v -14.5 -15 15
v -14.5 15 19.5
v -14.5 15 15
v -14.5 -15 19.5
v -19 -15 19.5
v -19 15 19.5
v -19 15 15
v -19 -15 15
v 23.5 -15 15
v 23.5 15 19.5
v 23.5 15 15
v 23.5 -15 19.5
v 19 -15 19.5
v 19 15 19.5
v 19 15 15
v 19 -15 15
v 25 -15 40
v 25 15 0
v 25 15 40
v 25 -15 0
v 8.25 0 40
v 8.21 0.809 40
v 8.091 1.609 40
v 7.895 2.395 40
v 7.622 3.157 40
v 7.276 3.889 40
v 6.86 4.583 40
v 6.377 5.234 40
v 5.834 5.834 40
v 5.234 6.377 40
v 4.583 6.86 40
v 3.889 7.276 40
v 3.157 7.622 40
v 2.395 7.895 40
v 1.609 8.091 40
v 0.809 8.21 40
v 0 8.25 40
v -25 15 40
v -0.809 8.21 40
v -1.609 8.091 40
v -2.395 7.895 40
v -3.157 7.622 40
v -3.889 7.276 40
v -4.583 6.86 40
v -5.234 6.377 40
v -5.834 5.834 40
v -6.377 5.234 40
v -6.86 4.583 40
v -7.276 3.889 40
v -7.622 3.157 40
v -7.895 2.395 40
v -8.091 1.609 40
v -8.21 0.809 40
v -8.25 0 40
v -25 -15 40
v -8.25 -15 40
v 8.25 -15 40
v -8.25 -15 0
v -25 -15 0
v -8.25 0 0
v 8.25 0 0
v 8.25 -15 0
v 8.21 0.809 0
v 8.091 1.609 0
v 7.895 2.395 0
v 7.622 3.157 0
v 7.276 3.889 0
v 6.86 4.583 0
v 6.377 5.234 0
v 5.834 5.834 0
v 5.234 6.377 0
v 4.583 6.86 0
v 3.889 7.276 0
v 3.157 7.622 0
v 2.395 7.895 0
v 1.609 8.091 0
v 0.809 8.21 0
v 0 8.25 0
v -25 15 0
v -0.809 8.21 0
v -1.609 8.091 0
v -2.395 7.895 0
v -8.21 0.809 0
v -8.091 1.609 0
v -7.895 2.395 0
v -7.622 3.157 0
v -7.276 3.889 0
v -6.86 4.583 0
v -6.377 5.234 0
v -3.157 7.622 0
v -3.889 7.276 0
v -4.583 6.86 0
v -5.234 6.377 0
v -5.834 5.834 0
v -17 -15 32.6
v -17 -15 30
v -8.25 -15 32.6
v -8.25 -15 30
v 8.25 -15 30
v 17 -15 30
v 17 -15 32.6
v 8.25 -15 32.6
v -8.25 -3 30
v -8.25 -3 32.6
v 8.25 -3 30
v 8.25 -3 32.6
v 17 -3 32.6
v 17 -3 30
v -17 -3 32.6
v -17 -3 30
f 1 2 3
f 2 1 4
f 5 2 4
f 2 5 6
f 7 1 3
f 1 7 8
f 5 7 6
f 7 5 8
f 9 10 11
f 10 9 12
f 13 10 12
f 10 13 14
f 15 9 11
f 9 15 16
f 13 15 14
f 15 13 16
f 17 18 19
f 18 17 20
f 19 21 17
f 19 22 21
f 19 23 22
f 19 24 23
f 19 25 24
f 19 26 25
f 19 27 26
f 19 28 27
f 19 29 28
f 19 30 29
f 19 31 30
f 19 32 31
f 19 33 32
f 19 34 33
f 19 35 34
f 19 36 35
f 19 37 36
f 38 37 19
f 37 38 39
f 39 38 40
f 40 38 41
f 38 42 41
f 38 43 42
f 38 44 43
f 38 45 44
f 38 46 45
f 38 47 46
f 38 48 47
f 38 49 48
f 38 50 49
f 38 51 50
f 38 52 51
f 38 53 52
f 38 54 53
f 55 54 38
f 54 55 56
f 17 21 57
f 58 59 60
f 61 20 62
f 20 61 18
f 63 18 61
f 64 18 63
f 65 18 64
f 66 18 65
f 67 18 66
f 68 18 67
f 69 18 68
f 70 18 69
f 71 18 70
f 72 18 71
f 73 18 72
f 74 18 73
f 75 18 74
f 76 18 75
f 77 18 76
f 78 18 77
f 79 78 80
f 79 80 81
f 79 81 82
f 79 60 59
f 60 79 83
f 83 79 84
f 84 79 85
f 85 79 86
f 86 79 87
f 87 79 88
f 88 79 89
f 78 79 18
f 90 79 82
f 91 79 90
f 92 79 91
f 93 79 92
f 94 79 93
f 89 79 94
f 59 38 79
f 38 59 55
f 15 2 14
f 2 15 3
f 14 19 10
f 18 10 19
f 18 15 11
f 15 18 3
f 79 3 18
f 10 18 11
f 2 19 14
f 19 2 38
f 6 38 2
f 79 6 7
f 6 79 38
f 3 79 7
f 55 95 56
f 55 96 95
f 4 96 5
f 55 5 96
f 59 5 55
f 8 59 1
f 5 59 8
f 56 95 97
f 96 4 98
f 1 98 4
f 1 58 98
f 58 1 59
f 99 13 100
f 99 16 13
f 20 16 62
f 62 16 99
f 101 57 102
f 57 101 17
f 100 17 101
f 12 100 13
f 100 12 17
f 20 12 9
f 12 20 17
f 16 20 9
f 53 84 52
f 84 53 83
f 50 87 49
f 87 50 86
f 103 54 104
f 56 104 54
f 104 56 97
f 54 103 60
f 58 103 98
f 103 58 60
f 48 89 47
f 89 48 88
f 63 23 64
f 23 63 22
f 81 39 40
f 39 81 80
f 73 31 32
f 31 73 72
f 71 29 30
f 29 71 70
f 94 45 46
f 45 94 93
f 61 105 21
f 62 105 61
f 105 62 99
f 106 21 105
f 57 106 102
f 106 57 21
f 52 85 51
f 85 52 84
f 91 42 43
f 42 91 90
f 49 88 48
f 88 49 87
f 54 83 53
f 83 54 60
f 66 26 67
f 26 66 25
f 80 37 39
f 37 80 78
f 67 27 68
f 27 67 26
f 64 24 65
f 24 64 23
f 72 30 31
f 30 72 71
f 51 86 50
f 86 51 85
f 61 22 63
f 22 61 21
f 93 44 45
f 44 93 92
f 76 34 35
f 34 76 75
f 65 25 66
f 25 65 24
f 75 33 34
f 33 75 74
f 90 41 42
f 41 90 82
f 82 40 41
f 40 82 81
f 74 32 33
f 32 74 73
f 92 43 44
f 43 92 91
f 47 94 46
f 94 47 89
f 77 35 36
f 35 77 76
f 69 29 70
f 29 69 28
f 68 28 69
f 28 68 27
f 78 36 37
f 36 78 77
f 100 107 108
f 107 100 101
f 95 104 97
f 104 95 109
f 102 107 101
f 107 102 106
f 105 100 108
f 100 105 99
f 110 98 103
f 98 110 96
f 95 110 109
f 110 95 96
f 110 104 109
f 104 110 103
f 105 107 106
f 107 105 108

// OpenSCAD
// Wall-mounted syringe holder for 10mL syringe
// Designed for FDM printing, standing on the XY plane.

// --- Dimensions ---
block_w = 50.0;      // Block width (X)
block_d = 30.0;      // Block depth (Y)
block_h = 40.0;      // Block height (Z)

barrel_dia = 16.5;   // Width of the vertical barrel channel
barrel_rad = barrel_dia / 2;

flange_w = 34.0;     // Width of the flange slot (X)
flange_h = 2.6;      // Height of the flange slot (Z)
flange_z_start = 30.0; // Bottom of the flange slot
flange_y_depth = 11.0; // How far back the slot goes from the front face

screw_hole_d = 4.5;  // Diameter for M4 screws
screw_hole_x = 19.0; // Offset of screw holes from center (X)
screw_hole_z = 15.0; // Height of screw holes (Z)

$fn = 64;

// --- Modeling ---

// The block is centered on X and Y.
// X: -25 to 25
// Y: -15 to 15 (Back face at y=15, Front face at y=-15)
// Z: 0 to 40

difference() {
    // 1. The main block
    translate([-block_w/2, -block_d/2, 0])
        cube([block_w, block_d, block_h]);

    // 2. Barrel Channel (Subtracted)
    // "a 16.5 mm wide vertical barrel channel runs through the full height"
    // "its back end is a half-circle of 8.25 mm radius centred at x = 0, y = 0"
    // "its straight sides run forward to the front face (y = -15)"
    // This implies the profile in XY is a rectangle from y=-15 to y=0 
    // and a semi-circle centered at (0,0) extending to y=8.25.
    translate([0, 0, -1])
    linear_extrude(height = block_h + 2) {
        union() {
            // Rectangular part: x from -8.25 to 8.25, y from -15 to 0
            translate([-barrel_rad, -15, 0])
                square([barrel_dia, 15]);
            
            // Semi-circle part: centered at (0,0) with radius 8.25
            // We use a circle and cut it to keep only the part where y > 0
            difference() {
                circle(d = barrel_dia);
                translate([-barrel_rad, -barrel_rad, 0])
                    square([barrel_dia, barrel_rad]);
            }
        }
    }

    // 3. Flange Slot (Subtracted)
    // "34 mm wide (X, centred) and 2.6 mm tall (z = 30 to 32.6), 
    // is cut in from the front face back to y = 11."
    // Front face is at y = -15.
    // Slot goes from y = -15 to y = 11.
    translate([-flange_w/2, -15 - 1, flange_z_start])
        cube([flange_w, flange_y_depth + 2, flange_h]);

    // 4. Screw Holes (Subtracted)
    // "Two 4.5 mm holes for M4 wall screws go straight through from front to back (along Y) 
    // at x = -19 and 19, z = 15."
    for (sx = [-screw_hole_x, screw_hole_x]) {
        translate([sx, -15 - 1, screw_hole_z])
            cube([screw_hole_d, block_d + 2, screw_hole_d]);
    }
}
